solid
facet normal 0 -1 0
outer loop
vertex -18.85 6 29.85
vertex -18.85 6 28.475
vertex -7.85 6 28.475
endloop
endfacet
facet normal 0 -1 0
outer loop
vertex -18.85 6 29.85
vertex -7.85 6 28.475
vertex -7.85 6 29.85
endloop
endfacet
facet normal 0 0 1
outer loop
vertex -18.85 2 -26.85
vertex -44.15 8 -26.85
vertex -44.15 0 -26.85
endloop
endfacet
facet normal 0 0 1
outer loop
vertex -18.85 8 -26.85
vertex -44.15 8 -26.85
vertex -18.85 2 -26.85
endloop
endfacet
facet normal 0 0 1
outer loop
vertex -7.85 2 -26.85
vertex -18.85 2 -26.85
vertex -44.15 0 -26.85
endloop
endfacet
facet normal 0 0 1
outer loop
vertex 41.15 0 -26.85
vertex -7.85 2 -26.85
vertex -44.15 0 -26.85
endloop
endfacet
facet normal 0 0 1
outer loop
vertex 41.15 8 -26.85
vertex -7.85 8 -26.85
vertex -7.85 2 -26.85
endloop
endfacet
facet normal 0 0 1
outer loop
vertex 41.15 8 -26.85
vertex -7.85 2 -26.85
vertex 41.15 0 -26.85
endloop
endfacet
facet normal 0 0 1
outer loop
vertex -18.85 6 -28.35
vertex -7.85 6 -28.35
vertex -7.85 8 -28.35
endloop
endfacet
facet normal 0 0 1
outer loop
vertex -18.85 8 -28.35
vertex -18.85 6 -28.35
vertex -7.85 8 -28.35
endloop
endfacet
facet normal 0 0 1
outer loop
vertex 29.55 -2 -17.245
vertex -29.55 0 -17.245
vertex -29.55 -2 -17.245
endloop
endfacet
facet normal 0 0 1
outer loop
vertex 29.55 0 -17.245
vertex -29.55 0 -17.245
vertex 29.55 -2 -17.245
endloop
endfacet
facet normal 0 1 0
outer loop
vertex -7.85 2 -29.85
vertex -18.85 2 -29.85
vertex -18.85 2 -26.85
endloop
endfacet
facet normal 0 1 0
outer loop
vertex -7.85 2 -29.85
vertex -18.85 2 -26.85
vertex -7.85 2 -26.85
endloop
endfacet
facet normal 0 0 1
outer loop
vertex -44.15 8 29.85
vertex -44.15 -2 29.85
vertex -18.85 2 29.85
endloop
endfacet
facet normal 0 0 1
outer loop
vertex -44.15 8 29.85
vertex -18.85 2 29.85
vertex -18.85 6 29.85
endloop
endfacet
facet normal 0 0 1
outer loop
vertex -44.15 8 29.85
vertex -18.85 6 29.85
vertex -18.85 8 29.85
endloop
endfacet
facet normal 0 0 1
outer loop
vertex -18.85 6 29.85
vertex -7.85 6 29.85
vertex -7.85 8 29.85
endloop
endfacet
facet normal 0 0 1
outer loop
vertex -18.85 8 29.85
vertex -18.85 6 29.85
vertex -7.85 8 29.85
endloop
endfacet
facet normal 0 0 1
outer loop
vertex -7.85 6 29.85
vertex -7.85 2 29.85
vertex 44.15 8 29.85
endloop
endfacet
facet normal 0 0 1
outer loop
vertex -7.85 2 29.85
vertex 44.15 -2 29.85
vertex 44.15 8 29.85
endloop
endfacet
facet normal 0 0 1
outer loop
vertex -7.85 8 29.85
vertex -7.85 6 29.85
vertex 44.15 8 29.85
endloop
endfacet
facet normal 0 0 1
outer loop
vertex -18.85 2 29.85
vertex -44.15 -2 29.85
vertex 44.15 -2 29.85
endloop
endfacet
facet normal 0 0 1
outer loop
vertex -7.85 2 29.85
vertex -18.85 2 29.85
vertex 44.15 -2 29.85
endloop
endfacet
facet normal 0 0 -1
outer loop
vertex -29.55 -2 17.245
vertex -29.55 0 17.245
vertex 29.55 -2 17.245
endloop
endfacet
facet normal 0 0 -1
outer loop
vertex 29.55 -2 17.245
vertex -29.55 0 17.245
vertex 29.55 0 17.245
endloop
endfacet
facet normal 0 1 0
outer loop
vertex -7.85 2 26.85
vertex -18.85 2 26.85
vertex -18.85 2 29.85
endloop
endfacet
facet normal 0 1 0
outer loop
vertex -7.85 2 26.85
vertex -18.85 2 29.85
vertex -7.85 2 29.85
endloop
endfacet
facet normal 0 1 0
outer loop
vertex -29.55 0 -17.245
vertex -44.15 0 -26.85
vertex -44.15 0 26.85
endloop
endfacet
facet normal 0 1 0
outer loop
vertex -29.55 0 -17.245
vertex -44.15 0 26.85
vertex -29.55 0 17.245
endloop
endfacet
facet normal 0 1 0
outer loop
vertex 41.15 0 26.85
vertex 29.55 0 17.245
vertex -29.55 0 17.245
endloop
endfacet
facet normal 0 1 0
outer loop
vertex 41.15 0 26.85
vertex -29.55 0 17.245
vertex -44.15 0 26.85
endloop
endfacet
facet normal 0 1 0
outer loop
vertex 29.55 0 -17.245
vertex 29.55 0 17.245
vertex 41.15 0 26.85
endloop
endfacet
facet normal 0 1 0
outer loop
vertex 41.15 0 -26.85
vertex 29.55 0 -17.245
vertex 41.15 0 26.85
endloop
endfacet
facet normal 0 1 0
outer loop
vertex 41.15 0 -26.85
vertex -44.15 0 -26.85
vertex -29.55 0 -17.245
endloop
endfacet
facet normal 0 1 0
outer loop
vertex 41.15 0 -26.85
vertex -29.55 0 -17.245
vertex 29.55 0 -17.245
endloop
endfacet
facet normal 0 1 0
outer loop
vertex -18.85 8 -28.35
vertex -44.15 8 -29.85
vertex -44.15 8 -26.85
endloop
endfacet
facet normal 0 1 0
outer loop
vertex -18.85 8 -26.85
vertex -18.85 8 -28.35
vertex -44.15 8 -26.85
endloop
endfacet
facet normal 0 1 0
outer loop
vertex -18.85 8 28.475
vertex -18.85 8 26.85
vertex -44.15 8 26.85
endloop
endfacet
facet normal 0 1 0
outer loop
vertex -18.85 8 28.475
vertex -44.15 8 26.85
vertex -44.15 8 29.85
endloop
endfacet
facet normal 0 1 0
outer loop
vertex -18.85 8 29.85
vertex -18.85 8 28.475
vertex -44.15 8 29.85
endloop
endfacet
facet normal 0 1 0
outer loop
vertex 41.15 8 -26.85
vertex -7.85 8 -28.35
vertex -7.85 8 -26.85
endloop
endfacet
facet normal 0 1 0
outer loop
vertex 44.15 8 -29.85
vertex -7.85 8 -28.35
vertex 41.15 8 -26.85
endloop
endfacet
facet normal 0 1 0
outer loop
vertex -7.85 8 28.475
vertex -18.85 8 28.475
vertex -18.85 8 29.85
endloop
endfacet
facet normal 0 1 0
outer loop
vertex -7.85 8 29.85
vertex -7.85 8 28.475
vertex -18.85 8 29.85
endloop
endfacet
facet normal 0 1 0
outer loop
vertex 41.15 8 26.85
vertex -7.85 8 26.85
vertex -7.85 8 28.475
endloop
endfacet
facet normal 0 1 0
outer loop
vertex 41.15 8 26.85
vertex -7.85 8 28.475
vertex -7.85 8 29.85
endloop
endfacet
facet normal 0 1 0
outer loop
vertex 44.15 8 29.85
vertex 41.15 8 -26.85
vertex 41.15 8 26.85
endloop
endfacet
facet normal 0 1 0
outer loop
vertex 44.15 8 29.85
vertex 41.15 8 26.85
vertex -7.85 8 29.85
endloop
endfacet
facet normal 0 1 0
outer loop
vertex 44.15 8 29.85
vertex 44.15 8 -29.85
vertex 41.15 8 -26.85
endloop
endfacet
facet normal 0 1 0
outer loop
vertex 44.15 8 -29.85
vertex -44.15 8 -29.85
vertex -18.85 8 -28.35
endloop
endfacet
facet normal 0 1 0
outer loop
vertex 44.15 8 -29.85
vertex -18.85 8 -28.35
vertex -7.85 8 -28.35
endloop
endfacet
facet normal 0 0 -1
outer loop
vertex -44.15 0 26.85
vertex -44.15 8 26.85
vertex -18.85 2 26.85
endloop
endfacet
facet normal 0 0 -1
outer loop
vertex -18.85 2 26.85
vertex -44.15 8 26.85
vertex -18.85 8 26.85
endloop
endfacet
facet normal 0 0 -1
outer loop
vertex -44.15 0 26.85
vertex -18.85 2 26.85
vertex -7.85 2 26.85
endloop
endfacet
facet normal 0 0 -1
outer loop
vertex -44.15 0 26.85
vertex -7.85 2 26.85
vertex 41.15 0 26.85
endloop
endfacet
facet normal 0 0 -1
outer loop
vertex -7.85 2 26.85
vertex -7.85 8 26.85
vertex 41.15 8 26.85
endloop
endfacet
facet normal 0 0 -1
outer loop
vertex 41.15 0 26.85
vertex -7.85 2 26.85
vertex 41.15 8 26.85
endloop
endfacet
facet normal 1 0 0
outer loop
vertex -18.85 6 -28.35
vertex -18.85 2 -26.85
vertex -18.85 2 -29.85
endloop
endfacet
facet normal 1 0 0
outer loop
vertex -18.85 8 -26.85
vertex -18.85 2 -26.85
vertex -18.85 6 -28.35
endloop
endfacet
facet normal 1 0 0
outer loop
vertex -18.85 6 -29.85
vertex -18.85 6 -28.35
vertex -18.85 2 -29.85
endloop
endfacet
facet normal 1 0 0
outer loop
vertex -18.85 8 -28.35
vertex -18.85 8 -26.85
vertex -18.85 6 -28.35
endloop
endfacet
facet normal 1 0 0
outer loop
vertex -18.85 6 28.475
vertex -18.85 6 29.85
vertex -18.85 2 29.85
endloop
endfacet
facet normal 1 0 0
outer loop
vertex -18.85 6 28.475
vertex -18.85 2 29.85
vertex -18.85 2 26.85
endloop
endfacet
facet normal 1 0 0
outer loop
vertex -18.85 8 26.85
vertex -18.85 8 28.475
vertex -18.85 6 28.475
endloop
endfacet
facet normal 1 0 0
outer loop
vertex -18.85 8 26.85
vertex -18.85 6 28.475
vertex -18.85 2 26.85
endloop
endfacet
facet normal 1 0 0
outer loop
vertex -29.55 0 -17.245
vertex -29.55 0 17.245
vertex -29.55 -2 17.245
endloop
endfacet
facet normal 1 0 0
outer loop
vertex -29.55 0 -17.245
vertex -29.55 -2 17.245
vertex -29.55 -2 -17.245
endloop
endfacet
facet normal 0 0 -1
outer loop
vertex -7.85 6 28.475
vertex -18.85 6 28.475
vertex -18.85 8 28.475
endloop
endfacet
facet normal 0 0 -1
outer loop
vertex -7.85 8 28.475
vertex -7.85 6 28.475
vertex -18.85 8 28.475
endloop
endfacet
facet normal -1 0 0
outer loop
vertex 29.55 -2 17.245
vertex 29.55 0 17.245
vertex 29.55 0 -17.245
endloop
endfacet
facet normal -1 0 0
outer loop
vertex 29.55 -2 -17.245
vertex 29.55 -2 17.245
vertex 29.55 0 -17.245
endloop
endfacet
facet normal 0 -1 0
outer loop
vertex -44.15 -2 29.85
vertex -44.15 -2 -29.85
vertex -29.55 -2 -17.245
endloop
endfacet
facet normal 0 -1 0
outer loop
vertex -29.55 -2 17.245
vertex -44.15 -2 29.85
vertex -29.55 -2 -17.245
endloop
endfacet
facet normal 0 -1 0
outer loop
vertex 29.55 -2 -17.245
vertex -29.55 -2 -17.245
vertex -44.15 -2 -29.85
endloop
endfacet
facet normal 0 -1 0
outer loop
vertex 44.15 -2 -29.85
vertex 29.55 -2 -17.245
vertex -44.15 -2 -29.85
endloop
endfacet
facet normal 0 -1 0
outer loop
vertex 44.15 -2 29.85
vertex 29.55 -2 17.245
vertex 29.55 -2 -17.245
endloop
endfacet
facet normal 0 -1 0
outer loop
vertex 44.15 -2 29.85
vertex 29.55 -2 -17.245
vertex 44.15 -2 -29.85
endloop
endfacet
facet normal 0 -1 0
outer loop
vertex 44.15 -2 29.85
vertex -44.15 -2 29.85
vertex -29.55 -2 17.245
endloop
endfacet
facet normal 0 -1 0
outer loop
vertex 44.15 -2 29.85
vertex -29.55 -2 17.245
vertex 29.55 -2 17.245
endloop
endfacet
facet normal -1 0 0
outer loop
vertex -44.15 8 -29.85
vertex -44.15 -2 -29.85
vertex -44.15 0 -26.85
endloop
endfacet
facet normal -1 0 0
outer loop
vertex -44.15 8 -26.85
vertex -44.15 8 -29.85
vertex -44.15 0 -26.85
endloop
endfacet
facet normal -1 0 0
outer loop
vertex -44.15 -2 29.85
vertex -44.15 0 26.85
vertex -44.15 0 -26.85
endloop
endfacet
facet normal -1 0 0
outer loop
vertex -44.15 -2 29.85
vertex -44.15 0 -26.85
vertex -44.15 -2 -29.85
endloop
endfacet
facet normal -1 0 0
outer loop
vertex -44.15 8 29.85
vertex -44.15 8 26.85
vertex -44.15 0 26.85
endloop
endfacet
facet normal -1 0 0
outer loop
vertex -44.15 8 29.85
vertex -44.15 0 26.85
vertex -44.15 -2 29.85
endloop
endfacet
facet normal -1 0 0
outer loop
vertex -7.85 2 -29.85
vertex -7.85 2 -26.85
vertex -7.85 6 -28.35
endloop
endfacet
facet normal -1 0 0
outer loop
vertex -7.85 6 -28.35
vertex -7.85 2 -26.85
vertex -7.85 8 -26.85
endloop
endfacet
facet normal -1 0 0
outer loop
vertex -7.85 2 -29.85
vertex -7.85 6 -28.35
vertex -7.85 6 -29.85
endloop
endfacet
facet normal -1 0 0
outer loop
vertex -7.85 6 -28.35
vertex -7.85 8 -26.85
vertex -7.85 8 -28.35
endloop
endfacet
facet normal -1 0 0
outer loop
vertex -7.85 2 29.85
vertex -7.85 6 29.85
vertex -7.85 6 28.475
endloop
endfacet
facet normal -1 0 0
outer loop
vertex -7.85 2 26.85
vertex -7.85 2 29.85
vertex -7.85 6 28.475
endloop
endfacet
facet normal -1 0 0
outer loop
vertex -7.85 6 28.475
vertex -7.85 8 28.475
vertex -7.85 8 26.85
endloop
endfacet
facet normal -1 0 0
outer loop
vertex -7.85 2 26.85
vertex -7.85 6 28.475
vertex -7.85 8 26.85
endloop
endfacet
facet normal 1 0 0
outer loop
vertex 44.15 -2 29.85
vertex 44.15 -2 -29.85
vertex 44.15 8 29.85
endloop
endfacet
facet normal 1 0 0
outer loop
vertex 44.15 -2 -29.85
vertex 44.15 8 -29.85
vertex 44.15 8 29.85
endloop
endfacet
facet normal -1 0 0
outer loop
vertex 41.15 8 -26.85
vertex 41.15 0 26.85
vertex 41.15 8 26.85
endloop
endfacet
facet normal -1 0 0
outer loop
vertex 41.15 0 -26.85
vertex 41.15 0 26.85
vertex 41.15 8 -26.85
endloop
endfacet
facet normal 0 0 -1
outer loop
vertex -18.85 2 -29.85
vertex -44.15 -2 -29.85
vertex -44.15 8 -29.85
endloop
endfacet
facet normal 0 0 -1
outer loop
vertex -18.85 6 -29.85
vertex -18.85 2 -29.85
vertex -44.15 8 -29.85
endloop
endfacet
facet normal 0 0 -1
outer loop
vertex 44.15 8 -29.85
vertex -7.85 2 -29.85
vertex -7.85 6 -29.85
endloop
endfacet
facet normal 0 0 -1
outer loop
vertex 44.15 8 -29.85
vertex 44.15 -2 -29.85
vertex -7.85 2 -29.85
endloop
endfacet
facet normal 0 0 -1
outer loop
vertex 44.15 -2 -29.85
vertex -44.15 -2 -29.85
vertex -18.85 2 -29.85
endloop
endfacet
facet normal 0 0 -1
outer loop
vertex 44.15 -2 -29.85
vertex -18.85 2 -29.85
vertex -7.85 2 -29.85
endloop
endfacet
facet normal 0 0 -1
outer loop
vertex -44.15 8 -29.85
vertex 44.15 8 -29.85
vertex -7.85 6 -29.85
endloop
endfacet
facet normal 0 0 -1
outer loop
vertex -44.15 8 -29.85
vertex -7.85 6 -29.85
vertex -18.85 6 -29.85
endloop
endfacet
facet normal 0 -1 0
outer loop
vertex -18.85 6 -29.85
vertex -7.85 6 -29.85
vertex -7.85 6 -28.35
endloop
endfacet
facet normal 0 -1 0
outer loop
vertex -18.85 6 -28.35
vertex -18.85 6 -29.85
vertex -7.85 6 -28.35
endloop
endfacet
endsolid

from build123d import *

# Parameters (mm, degrees)
SKETCH_1_W          = 88.3
SKETCH_1_H          = 59.7
SKETCH_1_W_2        = 82.3
SKETCH_1_H_2        = 53.7
EXTRUDE_1_DEPTH     = 8
SKETCH_2_W          = 88.3
SKETCH_2_H          = 59.7
EXTRUDE_2_DEPTH     = 2
SKETCH_3_W          = 59.09959803
SKETCH_3_H          = 34.490013092
CUT_EXTRUDE_1_DEPTH = 2
SKETCH_4_W          = 3
SKETCH_4_H          = 53.7
CUT_EXTRUDE_2_DEPTH = 8
SKETCH_5_W          = 11
SKETCH_5_H          = 3
CUT_EXTRUDE_3_DEPTH = 6
SKETCH_6_W          = 1.375438735
SKETCH_6_H          = 2
EXTRUDE_3_DEPTH     = 11
EXTRUDE_4_REACH     = 62.49
SKETCH_7_W          = 1.5
SKETCH_7_H          = 2


with BuildPart() as part:
    # 草图1 → 凸台-拉伸1 (new body)
    with BuildSketch(Plane(origin=(0, 0, 0), x_dir=(1, 0, 0), z_dir=(0, 1, 0))):
        Rectangle(SKETCH_1_W, SKETCH_1_H)
        Rectangle(SKETCH_1_W_2, SKETCH_1_H_2, mode=Mode.SUBTRACT)
    extrude(amount=EXTRUDE_1_DEPTH)

    # 草图2 → 凸台-拉伸2 (add)
    with BuildSketch(Plane.XZ):
        Rectangle(SKETCH_2_W, SKETCH_2_H)
    extrude(amount=EXTRUDE_2_DEPTH)

    # 草图3 → 切除-拉伸1 (cut)
    with BuildSketch(Plane(origin=(0, 0, 0), x_dir=(1, 0, 0), z_dir=(0, 1, 0))):
        Rectangle(SKETCH_3_W, SKETCH_3_H)
    extrude(amount=-CUT_EXTRUDE_1_DEPTH, mode=Mode.SUBTRACT)

    # 草图4 → 切除-拉伸2 (cut)
    with BuildSketch(Plane(origin=(0, 8, 0), x_dir=(1, 0, 0), z_dir=(0, 1, 0))):
        with Locations((-42.65, 0)):
            Rectangle(SKETCH_4_W, SKETCH_4_H)
    extrude(amount=-CUT_EXTRUDE_2_DEPTH, mode=Mode.SUBTRACT)

    # 草图5 → 切除-拉伸3 (cut)
    with BuildSketch(Plane(origin=(0, 8, 0), x_dir=(1, 0, 0), z_dir=(0, 1, 0))):
        with Locations((-13.35, 28.35)):
            Rectangle(SKETCH_5_W, SKETCH_5_H)
        with Locations((-13.35, -28.35)):
            Rectangle(SKETCH_5_W, SKETCH_5_H)
    extrude(amount=-CUT_EXTRUDE_3_DEPTH, mode=Mode.SUBTRACT)

    # 草图6 → 凸台-拉伸3 (add)
    with BuildSketch(Plane.ZY.offset(7.85)):
        with Locations((29.162280632, 7)):
            Rectangle(SKETCH_6_W, SKETCH_6_H)
    extrude(amount=EXTRUDE_3_DEPTH)

    # 草图7 → 凸台-拉伸4 (add, up to next)
    with BuildSketch(Plane.ZY.offset(7.85), mode=Mode.PRIVATE) as extrude_4_sk1:
        with Locations((-29.1, 7)):
            Rectangle(SKETCH_7_W, SKETCH_7_H)
    extrude_4_tool1 = extrude(extrude_4_sk1.sketch, amount=EXTRUDE_4_REACH, mode=Mode.PRIVATE) - part.part
    add(extrude_4_tool1.solids().sort_by_distance((-7.85, 7, -29.1))[0])


solid = part.part
